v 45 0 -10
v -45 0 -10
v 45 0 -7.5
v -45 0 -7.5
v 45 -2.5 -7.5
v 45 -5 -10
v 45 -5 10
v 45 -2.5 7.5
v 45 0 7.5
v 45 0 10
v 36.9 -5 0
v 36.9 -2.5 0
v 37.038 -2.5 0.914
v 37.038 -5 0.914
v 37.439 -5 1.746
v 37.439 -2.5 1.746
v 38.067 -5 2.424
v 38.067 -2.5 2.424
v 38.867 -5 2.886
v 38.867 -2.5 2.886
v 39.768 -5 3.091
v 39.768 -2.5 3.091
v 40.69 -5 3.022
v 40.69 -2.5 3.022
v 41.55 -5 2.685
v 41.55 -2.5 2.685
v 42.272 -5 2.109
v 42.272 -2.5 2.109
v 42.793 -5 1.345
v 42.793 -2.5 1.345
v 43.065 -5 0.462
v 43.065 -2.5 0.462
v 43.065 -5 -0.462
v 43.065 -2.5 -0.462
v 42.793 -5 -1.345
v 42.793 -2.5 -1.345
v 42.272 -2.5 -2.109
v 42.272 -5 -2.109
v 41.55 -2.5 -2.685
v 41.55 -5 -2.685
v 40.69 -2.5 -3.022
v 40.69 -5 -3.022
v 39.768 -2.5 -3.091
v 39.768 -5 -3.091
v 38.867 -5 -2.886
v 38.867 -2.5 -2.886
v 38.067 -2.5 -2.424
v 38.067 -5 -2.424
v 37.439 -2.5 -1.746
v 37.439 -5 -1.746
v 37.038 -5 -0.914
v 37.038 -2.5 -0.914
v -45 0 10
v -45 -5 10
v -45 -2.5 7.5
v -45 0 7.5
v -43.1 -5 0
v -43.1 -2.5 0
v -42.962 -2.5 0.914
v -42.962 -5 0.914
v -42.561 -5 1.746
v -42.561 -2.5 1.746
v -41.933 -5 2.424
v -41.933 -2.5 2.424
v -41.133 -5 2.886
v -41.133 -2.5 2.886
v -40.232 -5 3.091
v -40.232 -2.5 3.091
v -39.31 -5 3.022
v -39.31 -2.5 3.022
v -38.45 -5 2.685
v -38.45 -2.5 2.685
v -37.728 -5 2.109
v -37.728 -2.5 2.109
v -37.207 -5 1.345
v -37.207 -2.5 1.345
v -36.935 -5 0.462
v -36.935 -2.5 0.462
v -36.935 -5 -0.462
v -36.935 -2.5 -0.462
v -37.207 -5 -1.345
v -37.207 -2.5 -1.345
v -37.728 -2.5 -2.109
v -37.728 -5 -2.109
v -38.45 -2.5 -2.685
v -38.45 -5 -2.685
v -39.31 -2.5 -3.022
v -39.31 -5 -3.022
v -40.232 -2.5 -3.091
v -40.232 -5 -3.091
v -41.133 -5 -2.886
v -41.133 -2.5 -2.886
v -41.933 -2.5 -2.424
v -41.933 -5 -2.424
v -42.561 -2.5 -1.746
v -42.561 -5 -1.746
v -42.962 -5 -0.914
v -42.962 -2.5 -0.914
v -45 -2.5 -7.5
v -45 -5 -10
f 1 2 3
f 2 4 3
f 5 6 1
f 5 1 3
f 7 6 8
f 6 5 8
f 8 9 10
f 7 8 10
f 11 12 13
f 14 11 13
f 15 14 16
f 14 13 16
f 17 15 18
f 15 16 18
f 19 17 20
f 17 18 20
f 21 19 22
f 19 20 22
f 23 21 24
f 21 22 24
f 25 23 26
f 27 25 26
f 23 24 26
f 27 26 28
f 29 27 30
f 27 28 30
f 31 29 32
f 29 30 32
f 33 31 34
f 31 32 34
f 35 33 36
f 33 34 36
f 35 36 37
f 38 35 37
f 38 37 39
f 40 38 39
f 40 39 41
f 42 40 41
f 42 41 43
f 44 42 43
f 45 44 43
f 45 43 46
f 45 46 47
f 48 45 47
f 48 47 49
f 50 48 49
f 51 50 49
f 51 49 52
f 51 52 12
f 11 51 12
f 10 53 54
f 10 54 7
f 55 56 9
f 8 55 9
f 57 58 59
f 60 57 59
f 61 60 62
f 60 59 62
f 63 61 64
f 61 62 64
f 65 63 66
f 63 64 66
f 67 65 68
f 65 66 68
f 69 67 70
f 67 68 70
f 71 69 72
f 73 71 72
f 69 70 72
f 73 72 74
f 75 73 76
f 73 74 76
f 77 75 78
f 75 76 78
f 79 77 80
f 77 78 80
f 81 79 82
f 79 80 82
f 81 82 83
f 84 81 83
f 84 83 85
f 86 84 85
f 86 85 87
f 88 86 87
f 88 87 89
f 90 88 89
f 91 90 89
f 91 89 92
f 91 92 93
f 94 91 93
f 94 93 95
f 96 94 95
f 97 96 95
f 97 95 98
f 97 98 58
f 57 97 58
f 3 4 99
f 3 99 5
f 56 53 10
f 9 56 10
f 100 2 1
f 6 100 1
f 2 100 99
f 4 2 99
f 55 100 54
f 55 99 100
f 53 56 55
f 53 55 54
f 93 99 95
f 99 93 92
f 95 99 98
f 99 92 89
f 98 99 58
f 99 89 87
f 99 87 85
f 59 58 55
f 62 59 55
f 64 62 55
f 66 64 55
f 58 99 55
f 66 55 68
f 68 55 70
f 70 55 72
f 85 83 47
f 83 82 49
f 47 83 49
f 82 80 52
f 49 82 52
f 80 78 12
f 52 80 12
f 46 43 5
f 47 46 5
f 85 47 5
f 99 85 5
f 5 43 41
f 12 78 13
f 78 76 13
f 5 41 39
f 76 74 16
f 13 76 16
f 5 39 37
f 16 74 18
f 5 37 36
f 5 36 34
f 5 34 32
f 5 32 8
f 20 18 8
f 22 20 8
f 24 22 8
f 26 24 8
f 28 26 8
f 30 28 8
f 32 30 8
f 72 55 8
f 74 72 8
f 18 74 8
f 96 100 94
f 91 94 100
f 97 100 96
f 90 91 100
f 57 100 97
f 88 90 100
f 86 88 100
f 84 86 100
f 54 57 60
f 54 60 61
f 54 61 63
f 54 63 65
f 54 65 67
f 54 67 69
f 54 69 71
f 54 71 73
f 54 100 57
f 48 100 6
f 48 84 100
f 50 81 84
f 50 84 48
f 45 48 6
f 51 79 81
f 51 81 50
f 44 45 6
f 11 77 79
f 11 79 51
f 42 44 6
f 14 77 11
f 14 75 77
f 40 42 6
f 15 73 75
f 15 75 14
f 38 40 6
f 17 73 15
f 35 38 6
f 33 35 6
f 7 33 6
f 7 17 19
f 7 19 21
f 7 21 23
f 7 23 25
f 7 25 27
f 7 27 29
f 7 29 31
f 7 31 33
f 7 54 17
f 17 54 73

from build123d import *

# Parameters (mm, degrees)
F0_W     = 90
F0_H     = 20
F1_DEPTH = 5
F2_T     = -2.5
F4_D     = 6.2


with BuildPart() as f1:
    # F0 (on Front) → F1 (new body)
    with BuildSketch(Plane.XZ):
        Rectangle(F0_W, F0_H)
    extrude(amount=F1_DEPTH)

    # F2
    f2_openings = [f1.faces().sort_by_distance(p)[0] for p in [
        (0, 0, 0),
        (45, -2.5, 0),
        (-45, -2.5, 0),
    ]]
    offset(amount=F2_T, openings=f2_openings)

    # F4 (through all)
    with Locations(Plane.XZ.offset(5)):
        with Locations((40, 0), (-40, 0)):
            Hole(F4_D / 2)


solid = f1.part
